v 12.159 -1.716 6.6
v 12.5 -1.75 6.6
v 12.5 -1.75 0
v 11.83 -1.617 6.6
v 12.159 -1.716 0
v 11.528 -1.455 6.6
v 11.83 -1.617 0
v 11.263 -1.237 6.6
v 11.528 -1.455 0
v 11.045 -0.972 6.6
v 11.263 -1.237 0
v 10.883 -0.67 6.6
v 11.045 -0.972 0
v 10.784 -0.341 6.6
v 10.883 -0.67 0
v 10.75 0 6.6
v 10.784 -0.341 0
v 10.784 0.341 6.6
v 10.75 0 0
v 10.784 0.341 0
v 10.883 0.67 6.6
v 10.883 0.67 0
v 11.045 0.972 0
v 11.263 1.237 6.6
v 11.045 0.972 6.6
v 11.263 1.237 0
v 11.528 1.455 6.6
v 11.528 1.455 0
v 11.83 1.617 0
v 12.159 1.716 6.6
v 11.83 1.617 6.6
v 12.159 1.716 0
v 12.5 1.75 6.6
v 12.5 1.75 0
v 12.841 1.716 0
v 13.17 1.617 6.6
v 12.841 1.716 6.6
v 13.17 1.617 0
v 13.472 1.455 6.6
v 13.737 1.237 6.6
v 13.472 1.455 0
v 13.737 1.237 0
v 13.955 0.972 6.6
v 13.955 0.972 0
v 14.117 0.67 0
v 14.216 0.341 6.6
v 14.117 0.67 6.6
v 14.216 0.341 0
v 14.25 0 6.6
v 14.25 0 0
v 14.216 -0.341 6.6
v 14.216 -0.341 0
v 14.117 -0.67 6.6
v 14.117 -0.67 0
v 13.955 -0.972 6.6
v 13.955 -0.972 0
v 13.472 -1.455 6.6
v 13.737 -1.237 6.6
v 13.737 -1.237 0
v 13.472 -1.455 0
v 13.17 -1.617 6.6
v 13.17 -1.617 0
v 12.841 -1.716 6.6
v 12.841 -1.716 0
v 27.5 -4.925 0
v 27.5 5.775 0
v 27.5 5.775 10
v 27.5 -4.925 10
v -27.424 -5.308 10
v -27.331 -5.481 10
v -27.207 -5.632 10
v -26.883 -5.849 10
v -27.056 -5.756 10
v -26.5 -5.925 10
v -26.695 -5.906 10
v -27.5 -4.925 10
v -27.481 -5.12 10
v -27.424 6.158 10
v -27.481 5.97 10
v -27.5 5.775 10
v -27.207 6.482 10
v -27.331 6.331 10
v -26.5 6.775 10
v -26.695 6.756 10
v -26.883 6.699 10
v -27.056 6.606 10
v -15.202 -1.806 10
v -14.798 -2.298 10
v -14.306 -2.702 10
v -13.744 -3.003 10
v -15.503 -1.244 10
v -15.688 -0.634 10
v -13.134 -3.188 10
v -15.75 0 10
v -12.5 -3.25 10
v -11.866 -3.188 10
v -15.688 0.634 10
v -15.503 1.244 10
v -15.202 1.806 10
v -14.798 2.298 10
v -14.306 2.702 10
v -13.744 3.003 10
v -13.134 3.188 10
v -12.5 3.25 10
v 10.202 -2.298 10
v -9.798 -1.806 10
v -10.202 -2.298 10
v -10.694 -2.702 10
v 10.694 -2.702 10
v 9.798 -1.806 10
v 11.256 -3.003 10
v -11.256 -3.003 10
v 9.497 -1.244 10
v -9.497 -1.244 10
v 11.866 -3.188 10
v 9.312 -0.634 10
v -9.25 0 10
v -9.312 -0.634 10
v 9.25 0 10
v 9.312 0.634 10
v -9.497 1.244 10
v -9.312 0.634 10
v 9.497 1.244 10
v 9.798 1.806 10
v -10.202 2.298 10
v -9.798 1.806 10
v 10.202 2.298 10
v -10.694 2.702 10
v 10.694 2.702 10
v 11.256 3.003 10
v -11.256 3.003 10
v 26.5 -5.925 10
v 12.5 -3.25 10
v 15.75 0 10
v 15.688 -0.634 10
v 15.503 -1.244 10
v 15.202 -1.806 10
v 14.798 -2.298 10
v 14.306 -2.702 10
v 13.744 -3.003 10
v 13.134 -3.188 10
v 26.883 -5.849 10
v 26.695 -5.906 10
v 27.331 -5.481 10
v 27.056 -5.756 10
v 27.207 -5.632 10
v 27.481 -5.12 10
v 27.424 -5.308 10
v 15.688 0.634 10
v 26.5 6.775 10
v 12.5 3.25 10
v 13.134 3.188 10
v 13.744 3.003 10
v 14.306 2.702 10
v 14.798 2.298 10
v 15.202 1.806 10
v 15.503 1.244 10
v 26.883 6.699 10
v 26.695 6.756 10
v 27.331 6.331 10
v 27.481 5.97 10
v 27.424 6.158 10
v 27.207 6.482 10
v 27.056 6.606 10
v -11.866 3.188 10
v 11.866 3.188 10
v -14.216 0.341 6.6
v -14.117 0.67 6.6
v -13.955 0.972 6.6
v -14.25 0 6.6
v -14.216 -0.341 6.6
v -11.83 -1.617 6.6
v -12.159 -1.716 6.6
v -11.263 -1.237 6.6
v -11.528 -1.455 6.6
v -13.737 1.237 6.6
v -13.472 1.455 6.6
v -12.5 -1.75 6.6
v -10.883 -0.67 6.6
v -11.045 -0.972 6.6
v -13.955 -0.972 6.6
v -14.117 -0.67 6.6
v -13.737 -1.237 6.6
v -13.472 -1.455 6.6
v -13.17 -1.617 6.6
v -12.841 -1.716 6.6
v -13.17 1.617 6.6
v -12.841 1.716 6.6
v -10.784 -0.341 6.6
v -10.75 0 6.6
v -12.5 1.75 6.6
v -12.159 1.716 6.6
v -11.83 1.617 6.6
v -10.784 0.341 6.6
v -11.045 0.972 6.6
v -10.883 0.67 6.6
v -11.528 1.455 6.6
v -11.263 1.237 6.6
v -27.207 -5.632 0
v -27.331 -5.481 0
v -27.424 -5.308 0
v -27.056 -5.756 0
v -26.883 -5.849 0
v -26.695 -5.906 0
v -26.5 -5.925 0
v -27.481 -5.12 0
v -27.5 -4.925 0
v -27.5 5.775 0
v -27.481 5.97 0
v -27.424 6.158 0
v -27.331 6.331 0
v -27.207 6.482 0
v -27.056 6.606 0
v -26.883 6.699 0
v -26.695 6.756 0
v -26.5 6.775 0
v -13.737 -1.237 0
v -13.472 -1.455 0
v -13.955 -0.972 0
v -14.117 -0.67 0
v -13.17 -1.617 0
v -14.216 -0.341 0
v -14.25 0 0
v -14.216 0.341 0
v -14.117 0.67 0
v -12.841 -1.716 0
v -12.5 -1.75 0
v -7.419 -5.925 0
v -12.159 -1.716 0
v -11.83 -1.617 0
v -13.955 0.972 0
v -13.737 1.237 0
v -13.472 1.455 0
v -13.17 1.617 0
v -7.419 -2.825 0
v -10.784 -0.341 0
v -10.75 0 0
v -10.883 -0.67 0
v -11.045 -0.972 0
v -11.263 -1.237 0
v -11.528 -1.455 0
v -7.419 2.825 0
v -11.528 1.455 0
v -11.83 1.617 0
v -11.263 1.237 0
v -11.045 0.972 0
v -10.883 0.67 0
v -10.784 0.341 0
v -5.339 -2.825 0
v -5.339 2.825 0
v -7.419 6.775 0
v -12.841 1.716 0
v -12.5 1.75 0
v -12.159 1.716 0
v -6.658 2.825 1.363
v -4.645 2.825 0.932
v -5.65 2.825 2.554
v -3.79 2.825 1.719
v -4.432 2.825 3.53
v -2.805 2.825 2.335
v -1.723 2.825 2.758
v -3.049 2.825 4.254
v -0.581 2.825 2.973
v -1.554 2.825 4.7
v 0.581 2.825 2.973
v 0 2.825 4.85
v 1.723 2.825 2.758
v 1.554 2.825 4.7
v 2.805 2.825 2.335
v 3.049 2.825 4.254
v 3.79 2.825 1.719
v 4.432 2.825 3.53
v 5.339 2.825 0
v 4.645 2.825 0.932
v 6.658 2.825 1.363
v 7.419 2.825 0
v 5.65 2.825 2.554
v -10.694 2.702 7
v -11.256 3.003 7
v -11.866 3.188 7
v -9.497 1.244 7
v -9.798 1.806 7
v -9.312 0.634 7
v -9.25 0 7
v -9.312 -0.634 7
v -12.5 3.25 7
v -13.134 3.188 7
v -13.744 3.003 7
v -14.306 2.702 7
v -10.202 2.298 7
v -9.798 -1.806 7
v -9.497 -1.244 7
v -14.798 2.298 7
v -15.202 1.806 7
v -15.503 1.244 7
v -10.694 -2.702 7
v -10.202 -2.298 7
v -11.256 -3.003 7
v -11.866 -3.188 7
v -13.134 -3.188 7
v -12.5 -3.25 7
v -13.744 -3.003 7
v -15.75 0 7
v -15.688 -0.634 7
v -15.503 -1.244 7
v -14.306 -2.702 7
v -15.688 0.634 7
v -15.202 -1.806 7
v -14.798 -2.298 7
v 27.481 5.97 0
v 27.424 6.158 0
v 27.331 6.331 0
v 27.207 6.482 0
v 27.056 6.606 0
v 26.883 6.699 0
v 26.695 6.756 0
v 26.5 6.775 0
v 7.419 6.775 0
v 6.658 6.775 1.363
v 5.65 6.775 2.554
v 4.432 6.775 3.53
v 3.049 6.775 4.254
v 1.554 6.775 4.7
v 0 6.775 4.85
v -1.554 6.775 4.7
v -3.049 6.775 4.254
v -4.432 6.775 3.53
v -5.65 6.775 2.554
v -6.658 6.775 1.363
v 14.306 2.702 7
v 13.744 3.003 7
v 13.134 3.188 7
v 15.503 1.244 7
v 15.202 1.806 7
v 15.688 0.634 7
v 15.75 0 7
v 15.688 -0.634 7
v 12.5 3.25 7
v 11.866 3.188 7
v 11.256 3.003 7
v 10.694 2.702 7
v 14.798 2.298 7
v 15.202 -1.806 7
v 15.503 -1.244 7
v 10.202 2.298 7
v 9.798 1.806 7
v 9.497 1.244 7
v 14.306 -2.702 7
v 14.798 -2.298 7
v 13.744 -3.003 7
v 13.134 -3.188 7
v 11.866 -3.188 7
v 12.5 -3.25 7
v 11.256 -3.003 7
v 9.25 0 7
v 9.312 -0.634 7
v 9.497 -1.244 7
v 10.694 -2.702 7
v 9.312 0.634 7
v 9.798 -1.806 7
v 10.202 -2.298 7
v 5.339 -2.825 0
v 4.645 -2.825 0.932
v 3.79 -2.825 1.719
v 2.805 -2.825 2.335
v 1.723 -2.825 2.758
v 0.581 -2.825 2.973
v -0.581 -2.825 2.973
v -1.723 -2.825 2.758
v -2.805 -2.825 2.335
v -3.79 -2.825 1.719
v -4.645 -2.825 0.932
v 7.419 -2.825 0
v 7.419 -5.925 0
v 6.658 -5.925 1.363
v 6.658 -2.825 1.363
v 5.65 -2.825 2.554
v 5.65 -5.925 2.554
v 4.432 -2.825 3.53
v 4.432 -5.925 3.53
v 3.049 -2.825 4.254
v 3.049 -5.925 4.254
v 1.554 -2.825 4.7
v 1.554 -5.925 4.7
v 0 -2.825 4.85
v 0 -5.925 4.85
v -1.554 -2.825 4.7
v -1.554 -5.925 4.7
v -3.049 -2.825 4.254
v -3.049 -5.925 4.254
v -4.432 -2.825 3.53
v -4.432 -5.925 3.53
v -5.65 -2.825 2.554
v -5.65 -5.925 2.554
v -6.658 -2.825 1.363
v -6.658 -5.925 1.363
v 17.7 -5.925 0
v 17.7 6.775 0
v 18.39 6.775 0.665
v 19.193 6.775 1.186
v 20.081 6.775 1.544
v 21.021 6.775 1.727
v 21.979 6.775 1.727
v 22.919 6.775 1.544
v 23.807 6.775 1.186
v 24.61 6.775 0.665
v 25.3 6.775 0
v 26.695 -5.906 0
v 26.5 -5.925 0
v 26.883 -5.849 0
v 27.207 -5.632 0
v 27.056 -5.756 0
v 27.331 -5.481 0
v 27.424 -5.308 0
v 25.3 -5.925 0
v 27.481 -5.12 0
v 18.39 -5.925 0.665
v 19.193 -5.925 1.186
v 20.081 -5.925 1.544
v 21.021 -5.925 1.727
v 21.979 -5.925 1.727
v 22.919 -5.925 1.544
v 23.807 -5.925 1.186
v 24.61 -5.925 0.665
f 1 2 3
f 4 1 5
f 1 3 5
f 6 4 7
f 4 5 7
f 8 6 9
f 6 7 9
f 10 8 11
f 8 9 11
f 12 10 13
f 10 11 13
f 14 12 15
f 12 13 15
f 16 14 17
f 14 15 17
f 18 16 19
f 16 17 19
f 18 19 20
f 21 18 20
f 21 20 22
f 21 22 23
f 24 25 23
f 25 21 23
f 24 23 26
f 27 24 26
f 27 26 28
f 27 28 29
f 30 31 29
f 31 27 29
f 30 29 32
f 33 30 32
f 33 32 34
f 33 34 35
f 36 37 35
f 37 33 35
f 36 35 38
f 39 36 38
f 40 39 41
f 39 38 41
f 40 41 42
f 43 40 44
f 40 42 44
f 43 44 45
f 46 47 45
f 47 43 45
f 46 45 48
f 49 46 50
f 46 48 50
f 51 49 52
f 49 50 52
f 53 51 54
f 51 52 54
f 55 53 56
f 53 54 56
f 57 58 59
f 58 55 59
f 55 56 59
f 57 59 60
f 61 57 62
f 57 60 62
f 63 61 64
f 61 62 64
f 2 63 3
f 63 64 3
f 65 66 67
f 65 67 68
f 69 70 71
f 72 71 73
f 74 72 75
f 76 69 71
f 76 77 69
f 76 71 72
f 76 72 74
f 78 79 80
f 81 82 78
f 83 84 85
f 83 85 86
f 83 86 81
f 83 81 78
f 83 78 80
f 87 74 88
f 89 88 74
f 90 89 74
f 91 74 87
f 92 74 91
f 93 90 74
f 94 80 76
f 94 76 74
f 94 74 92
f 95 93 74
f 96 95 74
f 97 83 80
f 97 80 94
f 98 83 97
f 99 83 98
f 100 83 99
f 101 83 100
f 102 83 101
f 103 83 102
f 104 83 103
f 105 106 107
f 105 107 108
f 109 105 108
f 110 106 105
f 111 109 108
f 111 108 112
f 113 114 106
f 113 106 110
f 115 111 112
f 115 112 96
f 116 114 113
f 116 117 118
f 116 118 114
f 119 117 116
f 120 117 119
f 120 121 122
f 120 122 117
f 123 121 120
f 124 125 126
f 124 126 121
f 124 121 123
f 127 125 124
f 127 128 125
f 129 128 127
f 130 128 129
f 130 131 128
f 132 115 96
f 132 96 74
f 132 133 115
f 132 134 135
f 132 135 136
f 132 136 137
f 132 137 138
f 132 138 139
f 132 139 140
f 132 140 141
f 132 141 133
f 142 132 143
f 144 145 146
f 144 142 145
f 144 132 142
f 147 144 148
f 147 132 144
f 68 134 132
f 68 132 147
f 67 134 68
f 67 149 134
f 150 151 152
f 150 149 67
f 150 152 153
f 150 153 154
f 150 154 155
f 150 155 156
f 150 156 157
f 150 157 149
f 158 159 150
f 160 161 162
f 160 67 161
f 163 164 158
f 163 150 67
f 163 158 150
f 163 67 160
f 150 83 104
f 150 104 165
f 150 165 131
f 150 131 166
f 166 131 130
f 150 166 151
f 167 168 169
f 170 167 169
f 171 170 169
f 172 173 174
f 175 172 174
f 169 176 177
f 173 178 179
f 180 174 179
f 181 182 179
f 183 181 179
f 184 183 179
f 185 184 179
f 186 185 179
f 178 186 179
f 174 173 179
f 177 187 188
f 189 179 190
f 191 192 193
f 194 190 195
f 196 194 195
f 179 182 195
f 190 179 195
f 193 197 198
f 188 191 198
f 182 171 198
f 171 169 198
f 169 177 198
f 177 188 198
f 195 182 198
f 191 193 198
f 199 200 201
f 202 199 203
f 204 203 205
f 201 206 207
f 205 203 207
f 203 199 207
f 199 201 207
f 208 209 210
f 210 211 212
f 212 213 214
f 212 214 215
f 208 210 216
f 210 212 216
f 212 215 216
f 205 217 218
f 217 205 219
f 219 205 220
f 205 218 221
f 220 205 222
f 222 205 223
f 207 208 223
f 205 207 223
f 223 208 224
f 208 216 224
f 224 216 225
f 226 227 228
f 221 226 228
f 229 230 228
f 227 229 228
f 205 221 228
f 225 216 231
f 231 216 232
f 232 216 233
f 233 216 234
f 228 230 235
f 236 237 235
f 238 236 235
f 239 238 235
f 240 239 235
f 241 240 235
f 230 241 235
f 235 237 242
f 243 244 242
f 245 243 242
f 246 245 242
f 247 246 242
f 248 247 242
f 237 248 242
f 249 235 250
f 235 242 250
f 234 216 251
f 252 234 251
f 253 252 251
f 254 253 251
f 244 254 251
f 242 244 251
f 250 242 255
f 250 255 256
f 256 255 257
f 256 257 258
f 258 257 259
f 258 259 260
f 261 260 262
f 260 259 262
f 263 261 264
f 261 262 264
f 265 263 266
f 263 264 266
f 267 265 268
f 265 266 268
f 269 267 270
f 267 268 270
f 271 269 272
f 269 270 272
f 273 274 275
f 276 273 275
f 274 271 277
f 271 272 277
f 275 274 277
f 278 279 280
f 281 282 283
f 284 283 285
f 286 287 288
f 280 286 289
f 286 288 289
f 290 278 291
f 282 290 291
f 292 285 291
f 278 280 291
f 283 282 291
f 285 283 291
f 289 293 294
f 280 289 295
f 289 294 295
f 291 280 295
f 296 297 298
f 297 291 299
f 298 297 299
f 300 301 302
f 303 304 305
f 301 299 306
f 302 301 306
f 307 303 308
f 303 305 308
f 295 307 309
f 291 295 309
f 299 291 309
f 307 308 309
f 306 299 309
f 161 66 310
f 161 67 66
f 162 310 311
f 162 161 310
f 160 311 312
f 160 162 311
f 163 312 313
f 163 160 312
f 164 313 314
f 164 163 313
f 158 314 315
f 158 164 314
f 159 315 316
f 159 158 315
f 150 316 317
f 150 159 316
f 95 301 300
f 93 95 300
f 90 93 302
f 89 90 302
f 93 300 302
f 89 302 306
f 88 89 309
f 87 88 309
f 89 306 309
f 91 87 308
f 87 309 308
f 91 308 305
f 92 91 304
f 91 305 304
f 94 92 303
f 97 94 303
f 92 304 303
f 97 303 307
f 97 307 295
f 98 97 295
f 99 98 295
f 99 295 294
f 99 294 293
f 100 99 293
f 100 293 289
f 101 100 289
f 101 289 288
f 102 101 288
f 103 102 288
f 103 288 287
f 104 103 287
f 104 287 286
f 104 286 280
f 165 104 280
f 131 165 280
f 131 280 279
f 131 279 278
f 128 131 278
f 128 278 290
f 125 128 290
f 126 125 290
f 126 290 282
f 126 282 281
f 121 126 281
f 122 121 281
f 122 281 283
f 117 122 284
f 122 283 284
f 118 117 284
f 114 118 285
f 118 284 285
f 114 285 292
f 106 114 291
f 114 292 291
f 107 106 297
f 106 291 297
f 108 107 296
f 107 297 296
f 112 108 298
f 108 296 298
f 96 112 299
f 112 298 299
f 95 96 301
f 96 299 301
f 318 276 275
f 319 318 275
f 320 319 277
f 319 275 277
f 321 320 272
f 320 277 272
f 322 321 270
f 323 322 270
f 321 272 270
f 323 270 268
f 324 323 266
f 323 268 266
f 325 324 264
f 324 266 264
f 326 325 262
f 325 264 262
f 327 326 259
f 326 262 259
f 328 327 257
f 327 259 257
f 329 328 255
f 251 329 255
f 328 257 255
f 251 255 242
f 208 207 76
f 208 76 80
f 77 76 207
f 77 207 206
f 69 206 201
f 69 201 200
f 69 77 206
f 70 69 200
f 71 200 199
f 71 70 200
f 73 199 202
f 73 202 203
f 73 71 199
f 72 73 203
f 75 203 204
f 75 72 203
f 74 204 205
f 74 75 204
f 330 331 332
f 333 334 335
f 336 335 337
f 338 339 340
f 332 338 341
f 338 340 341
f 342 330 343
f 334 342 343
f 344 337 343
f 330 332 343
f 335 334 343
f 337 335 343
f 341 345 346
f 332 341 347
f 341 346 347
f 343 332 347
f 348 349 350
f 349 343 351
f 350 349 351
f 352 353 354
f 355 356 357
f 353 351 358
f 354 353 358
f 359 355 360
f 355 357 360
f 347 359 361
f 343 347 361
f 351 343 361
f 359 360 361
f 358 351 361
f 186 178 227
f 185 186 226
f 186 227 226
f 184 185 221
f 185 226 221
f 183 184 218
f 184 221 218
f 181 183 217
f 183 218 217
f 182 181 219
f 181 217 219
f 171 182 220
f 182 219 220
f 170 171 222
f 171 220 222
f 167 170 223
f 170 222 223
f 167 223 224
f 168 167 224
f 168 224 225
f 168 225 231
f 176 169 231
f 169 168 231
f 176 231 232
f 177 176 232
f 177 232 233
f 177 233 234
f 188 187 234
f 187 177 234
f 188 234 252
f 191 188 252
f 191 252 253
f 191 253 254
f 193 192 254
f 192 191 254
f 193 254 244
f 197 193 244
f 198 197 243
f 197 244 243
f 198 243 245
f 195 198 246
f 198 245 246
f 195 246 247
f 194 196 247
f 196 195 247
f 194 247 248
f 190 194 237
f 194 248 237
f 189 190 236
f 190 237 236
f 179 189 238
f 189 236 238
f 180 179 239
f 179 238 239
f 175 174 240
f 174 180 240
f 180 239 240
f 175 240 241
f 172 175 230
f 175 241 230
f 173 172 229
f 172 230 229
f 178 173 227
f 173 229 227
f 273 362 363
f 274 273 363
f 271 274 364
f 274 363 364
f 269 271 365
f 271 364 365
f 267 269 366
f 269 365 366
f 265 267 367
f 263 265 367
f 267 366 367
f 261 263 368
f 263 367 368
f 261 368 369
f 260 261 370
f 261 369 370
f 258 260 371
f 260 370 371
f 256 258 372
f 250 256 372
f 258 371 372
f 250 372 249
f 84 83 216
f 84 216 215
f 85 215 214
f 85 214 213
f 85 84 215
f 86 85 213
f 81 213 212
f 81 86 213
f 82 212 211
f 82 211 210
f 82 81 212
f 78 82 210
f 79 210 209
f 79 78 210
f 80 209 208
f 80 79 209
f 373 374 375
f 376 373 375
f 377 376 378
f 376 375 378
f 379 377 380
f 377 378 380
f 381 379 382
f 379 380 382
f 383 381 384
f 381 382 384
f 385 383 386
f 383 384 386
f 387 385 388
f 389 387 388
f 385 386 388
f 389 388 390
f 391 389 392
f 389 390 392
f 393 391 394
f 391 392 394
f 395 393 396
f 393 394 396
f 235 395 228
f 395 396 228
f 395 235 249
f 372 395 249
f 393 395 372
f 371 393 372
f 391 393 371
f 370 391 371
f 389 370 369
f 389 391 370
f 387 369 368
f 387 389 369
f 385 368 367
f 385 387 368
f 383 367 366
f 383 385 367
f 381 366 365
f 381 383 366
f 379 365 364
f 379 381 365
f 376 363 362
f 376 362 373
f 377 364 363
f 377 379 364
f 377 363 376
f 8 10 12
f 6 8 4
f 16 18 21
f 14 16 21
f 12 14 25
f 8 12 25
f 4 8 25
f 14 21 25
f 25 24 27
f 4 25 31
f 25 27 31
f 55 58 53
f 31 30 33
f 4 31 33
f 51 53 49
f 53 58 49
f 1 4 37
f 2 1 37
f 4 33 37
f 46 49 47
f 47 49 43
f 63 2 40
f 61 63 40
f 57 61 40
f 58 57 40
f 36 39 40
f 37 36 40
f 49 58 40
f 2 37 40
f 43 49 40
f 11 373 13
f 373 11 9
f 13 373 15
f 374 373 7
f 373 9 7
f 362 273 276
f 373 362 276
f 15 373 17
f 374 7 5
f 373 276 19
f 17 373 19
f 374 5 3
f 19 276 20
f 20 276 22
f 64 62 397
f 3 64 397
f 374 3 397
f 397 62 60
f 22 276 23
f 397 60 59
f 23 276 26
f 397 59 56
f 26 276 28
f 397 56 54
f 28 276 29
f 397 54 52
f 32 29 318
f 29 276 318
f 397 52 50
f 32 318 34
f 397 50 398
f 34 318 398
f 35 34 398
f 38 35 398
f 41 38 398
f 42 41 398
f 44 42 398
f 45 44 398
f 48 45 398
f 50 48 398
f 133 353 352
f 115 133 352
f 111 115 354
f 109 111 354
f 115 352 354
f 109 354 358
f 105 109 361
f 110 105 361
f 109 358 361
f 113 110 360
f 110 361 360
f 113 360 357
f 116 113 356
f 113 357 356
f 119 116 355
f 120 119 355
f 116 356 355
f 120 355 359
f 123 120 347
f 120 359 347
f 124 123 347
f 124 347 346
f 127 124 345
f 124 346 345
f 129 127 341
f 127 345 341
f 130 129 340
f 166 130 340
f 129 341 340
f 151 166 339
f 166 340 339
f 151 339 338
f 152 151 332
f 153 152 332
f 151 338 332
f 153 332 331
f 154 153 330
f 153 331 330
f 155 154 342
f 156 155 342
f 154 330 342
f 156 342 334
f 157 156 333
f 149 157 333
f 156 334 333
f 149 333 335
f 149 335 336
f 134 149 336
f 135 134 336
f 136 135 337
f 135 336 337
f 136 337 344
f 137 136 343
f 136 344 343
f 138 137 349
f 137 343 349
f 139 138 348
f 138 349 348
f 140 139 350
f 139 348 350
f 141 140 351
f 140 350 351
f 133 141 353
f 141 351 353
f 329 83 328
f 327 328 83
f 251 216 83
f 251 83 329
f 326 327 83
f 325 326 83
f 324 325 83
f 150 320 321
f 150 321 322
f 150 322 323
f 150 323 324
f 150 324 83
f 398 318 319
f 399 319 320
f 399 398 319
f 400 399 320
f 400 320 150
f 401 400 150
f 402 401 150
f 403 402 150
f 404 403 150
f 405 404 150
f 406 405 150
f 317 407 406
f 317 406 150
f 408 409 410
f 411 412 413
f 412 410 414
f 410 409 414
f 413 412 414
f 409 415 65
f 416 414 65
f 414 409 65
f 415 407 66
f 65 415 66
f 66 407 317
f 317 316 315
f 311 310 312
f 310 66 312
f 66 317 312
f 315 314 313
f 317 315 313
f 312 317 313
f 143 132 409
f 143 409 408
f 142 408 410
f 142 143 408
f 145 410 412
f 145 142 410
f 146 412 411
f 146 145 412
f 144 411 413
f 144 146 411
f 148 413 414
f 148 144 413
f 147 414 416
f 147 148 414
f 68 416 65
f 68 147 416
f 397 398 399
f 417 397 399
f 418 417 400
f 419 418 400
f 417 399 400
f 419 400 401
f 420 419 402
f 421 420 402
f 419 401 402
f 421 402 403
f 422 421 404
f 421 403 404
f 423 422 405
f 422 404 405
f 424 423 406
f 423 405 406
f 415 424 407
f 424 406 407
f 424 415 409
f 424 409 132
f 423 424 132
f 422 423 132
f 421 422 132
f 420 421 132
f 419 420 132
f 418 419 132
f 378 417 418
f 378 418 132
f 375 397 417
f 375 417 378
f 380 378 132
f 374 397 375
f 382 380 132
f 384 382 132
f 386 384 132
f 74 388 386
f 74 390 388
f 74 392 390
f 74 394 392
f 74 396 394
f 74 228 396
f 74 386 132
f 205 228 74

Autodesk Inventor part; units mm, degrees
ref_plane "XZ Plane" through (0, 0, 0) normal (0, 1, 0) x (-1, 0, 0)
ref_plane "XY Plane" through (0, 0, 0) normal (0, 0, 1) x (1, 0, 0)
sketch "Sketch1" plane through (0, 0, 0) normal (0, 0, 1) x (1, 0, 0)
  line L0 (-27.5, 6.775) -> (27.5, 6.775)
  line L1 (27.5, 6.775) -> (27.5, -5.925)
  line L2 (27.5, -5.925) -> (-27.5, -5.925)
  line L3 (-27.5, -5.925) -> (-27.5, 6.775)
  point P0 (0, 0)
  dimension "d0" = 6.775
  dimension "d1" = 5.925
  dimension "d2" = 27.5
  dimension "d3" = 27.5
extrude "Extrusion1" add sketch "Sketch1" along normal blind 10
ref_plane "Work Plane1" through (0, 0, -3.25) normal (0, 0, -1) x (-1, 0, 0)
sketch "Sketch2" plane through (0, 0, -3.25) normal (0, 0, -1) x (-1, 0, 0)
  line L0 (27.5, 6.775) -> (-27.5, 6.775) projected
  line L1 (-27.5, -5.925) -> (27.5, -5.925) projected
  line L2 (0, 6.775) -> (-8.1, 6.775)
  line L3 (-27.5, 6.775) -> (27.5, 6.775) projected
  line L4 (-8.1, 6.775) -> (-8.1, 2.825)
  line L5 (-8.1, 2.825) -> (-6.25, 2.825)
  line L6 (-6.25, 2.825) -> (-6.25, -2.825)
  line L7 (-6.25, -2.825) -> (-8.1, -2.825)
  line L8 (-8.1, -2.825) -> (-8.1, -5.925)
  line L9 (27.5, -5.925) -> (-27.5, -5.925) projected
  line L10 (-8.1, -5.925) -> (0, -5.925)
  line L11 (0, -5.925) -> (0, 6.775)
  line L12 (0, -8.465) -> (0, 9.315) projected
  point P0 (0, 0)
  dimension "d7" = 8.1
  dimension "d8" = 6.25
  dimension "d9" = 3.95
  dimension "d10" = 3.1
revolve "Revolution1" cut sketch "Sketch2" angle 180 about axis through (0, 0, -3.25) along (0, -1, 0)
sketch "Sketch3" plane through (0, 0, 10) normal (0, 0, 1) x (1, 0, 0)
  line L0 (0, 0) -> (43.2339, 0) construction
  line L1 (0, 0) -> (-39.8542, 0) construction
  point P0 (-12.5, 0)
  point P1 (12.5, 0)
  dimension "d12" = 12.5
  dimension "d13" = 12.5
hole "Hole1" at (-12.5, 0, 10) at (12.5, 0, 10) direction (0, 0, -1) diameter 3.5 end through all counterbore diameter 6.5 counterbore depth 3
sketch "Sketch5" plane through (-27.5, 6.775, 10) normal (0, 1, 0) x (1, 0, 0)
  arc A0 (22.1615, 10) -> (32.8385, 10) centre (27.5, 13.25) ccw projected
  line L0 (27.5, 13.25) -> (61.0026, 13.25) construction
  line L1 (55, 10) -> (55, 0) projected
  circle A1 centre (49, 13.25) radius 5
  point P0 (27.5, 10)
  dimension "d26" = 6
  dimension "d27" = 10
extrude "Extrusion3" cut sketch "Sketch5" against normal through all
sketch "Sketch6" plane through (-12.5, 0, 7) normal (0, 0, 1) x (1, 0, 0)
  circle A0 centre (0, 0) radius 1.75 projected
  circle A1 centre (25, 0) radius 1.75 projected
  point P0 (12.5, 0)
extrude "Extrusion4" add sketch "Sketch6" against normal blind 0.4
fillet "Fillet2" radius 1 4 edges at (-27.5, 6.775, 5) (-27.5, -5.925, 5) (27.5, 6.775, 5) (27.5, -5.925, 5)
equation "\"d3\" = d2"
equation "\"d13\" = d12"
properties part number "Retainer_10mm" material "PC/ABS Plastic"
